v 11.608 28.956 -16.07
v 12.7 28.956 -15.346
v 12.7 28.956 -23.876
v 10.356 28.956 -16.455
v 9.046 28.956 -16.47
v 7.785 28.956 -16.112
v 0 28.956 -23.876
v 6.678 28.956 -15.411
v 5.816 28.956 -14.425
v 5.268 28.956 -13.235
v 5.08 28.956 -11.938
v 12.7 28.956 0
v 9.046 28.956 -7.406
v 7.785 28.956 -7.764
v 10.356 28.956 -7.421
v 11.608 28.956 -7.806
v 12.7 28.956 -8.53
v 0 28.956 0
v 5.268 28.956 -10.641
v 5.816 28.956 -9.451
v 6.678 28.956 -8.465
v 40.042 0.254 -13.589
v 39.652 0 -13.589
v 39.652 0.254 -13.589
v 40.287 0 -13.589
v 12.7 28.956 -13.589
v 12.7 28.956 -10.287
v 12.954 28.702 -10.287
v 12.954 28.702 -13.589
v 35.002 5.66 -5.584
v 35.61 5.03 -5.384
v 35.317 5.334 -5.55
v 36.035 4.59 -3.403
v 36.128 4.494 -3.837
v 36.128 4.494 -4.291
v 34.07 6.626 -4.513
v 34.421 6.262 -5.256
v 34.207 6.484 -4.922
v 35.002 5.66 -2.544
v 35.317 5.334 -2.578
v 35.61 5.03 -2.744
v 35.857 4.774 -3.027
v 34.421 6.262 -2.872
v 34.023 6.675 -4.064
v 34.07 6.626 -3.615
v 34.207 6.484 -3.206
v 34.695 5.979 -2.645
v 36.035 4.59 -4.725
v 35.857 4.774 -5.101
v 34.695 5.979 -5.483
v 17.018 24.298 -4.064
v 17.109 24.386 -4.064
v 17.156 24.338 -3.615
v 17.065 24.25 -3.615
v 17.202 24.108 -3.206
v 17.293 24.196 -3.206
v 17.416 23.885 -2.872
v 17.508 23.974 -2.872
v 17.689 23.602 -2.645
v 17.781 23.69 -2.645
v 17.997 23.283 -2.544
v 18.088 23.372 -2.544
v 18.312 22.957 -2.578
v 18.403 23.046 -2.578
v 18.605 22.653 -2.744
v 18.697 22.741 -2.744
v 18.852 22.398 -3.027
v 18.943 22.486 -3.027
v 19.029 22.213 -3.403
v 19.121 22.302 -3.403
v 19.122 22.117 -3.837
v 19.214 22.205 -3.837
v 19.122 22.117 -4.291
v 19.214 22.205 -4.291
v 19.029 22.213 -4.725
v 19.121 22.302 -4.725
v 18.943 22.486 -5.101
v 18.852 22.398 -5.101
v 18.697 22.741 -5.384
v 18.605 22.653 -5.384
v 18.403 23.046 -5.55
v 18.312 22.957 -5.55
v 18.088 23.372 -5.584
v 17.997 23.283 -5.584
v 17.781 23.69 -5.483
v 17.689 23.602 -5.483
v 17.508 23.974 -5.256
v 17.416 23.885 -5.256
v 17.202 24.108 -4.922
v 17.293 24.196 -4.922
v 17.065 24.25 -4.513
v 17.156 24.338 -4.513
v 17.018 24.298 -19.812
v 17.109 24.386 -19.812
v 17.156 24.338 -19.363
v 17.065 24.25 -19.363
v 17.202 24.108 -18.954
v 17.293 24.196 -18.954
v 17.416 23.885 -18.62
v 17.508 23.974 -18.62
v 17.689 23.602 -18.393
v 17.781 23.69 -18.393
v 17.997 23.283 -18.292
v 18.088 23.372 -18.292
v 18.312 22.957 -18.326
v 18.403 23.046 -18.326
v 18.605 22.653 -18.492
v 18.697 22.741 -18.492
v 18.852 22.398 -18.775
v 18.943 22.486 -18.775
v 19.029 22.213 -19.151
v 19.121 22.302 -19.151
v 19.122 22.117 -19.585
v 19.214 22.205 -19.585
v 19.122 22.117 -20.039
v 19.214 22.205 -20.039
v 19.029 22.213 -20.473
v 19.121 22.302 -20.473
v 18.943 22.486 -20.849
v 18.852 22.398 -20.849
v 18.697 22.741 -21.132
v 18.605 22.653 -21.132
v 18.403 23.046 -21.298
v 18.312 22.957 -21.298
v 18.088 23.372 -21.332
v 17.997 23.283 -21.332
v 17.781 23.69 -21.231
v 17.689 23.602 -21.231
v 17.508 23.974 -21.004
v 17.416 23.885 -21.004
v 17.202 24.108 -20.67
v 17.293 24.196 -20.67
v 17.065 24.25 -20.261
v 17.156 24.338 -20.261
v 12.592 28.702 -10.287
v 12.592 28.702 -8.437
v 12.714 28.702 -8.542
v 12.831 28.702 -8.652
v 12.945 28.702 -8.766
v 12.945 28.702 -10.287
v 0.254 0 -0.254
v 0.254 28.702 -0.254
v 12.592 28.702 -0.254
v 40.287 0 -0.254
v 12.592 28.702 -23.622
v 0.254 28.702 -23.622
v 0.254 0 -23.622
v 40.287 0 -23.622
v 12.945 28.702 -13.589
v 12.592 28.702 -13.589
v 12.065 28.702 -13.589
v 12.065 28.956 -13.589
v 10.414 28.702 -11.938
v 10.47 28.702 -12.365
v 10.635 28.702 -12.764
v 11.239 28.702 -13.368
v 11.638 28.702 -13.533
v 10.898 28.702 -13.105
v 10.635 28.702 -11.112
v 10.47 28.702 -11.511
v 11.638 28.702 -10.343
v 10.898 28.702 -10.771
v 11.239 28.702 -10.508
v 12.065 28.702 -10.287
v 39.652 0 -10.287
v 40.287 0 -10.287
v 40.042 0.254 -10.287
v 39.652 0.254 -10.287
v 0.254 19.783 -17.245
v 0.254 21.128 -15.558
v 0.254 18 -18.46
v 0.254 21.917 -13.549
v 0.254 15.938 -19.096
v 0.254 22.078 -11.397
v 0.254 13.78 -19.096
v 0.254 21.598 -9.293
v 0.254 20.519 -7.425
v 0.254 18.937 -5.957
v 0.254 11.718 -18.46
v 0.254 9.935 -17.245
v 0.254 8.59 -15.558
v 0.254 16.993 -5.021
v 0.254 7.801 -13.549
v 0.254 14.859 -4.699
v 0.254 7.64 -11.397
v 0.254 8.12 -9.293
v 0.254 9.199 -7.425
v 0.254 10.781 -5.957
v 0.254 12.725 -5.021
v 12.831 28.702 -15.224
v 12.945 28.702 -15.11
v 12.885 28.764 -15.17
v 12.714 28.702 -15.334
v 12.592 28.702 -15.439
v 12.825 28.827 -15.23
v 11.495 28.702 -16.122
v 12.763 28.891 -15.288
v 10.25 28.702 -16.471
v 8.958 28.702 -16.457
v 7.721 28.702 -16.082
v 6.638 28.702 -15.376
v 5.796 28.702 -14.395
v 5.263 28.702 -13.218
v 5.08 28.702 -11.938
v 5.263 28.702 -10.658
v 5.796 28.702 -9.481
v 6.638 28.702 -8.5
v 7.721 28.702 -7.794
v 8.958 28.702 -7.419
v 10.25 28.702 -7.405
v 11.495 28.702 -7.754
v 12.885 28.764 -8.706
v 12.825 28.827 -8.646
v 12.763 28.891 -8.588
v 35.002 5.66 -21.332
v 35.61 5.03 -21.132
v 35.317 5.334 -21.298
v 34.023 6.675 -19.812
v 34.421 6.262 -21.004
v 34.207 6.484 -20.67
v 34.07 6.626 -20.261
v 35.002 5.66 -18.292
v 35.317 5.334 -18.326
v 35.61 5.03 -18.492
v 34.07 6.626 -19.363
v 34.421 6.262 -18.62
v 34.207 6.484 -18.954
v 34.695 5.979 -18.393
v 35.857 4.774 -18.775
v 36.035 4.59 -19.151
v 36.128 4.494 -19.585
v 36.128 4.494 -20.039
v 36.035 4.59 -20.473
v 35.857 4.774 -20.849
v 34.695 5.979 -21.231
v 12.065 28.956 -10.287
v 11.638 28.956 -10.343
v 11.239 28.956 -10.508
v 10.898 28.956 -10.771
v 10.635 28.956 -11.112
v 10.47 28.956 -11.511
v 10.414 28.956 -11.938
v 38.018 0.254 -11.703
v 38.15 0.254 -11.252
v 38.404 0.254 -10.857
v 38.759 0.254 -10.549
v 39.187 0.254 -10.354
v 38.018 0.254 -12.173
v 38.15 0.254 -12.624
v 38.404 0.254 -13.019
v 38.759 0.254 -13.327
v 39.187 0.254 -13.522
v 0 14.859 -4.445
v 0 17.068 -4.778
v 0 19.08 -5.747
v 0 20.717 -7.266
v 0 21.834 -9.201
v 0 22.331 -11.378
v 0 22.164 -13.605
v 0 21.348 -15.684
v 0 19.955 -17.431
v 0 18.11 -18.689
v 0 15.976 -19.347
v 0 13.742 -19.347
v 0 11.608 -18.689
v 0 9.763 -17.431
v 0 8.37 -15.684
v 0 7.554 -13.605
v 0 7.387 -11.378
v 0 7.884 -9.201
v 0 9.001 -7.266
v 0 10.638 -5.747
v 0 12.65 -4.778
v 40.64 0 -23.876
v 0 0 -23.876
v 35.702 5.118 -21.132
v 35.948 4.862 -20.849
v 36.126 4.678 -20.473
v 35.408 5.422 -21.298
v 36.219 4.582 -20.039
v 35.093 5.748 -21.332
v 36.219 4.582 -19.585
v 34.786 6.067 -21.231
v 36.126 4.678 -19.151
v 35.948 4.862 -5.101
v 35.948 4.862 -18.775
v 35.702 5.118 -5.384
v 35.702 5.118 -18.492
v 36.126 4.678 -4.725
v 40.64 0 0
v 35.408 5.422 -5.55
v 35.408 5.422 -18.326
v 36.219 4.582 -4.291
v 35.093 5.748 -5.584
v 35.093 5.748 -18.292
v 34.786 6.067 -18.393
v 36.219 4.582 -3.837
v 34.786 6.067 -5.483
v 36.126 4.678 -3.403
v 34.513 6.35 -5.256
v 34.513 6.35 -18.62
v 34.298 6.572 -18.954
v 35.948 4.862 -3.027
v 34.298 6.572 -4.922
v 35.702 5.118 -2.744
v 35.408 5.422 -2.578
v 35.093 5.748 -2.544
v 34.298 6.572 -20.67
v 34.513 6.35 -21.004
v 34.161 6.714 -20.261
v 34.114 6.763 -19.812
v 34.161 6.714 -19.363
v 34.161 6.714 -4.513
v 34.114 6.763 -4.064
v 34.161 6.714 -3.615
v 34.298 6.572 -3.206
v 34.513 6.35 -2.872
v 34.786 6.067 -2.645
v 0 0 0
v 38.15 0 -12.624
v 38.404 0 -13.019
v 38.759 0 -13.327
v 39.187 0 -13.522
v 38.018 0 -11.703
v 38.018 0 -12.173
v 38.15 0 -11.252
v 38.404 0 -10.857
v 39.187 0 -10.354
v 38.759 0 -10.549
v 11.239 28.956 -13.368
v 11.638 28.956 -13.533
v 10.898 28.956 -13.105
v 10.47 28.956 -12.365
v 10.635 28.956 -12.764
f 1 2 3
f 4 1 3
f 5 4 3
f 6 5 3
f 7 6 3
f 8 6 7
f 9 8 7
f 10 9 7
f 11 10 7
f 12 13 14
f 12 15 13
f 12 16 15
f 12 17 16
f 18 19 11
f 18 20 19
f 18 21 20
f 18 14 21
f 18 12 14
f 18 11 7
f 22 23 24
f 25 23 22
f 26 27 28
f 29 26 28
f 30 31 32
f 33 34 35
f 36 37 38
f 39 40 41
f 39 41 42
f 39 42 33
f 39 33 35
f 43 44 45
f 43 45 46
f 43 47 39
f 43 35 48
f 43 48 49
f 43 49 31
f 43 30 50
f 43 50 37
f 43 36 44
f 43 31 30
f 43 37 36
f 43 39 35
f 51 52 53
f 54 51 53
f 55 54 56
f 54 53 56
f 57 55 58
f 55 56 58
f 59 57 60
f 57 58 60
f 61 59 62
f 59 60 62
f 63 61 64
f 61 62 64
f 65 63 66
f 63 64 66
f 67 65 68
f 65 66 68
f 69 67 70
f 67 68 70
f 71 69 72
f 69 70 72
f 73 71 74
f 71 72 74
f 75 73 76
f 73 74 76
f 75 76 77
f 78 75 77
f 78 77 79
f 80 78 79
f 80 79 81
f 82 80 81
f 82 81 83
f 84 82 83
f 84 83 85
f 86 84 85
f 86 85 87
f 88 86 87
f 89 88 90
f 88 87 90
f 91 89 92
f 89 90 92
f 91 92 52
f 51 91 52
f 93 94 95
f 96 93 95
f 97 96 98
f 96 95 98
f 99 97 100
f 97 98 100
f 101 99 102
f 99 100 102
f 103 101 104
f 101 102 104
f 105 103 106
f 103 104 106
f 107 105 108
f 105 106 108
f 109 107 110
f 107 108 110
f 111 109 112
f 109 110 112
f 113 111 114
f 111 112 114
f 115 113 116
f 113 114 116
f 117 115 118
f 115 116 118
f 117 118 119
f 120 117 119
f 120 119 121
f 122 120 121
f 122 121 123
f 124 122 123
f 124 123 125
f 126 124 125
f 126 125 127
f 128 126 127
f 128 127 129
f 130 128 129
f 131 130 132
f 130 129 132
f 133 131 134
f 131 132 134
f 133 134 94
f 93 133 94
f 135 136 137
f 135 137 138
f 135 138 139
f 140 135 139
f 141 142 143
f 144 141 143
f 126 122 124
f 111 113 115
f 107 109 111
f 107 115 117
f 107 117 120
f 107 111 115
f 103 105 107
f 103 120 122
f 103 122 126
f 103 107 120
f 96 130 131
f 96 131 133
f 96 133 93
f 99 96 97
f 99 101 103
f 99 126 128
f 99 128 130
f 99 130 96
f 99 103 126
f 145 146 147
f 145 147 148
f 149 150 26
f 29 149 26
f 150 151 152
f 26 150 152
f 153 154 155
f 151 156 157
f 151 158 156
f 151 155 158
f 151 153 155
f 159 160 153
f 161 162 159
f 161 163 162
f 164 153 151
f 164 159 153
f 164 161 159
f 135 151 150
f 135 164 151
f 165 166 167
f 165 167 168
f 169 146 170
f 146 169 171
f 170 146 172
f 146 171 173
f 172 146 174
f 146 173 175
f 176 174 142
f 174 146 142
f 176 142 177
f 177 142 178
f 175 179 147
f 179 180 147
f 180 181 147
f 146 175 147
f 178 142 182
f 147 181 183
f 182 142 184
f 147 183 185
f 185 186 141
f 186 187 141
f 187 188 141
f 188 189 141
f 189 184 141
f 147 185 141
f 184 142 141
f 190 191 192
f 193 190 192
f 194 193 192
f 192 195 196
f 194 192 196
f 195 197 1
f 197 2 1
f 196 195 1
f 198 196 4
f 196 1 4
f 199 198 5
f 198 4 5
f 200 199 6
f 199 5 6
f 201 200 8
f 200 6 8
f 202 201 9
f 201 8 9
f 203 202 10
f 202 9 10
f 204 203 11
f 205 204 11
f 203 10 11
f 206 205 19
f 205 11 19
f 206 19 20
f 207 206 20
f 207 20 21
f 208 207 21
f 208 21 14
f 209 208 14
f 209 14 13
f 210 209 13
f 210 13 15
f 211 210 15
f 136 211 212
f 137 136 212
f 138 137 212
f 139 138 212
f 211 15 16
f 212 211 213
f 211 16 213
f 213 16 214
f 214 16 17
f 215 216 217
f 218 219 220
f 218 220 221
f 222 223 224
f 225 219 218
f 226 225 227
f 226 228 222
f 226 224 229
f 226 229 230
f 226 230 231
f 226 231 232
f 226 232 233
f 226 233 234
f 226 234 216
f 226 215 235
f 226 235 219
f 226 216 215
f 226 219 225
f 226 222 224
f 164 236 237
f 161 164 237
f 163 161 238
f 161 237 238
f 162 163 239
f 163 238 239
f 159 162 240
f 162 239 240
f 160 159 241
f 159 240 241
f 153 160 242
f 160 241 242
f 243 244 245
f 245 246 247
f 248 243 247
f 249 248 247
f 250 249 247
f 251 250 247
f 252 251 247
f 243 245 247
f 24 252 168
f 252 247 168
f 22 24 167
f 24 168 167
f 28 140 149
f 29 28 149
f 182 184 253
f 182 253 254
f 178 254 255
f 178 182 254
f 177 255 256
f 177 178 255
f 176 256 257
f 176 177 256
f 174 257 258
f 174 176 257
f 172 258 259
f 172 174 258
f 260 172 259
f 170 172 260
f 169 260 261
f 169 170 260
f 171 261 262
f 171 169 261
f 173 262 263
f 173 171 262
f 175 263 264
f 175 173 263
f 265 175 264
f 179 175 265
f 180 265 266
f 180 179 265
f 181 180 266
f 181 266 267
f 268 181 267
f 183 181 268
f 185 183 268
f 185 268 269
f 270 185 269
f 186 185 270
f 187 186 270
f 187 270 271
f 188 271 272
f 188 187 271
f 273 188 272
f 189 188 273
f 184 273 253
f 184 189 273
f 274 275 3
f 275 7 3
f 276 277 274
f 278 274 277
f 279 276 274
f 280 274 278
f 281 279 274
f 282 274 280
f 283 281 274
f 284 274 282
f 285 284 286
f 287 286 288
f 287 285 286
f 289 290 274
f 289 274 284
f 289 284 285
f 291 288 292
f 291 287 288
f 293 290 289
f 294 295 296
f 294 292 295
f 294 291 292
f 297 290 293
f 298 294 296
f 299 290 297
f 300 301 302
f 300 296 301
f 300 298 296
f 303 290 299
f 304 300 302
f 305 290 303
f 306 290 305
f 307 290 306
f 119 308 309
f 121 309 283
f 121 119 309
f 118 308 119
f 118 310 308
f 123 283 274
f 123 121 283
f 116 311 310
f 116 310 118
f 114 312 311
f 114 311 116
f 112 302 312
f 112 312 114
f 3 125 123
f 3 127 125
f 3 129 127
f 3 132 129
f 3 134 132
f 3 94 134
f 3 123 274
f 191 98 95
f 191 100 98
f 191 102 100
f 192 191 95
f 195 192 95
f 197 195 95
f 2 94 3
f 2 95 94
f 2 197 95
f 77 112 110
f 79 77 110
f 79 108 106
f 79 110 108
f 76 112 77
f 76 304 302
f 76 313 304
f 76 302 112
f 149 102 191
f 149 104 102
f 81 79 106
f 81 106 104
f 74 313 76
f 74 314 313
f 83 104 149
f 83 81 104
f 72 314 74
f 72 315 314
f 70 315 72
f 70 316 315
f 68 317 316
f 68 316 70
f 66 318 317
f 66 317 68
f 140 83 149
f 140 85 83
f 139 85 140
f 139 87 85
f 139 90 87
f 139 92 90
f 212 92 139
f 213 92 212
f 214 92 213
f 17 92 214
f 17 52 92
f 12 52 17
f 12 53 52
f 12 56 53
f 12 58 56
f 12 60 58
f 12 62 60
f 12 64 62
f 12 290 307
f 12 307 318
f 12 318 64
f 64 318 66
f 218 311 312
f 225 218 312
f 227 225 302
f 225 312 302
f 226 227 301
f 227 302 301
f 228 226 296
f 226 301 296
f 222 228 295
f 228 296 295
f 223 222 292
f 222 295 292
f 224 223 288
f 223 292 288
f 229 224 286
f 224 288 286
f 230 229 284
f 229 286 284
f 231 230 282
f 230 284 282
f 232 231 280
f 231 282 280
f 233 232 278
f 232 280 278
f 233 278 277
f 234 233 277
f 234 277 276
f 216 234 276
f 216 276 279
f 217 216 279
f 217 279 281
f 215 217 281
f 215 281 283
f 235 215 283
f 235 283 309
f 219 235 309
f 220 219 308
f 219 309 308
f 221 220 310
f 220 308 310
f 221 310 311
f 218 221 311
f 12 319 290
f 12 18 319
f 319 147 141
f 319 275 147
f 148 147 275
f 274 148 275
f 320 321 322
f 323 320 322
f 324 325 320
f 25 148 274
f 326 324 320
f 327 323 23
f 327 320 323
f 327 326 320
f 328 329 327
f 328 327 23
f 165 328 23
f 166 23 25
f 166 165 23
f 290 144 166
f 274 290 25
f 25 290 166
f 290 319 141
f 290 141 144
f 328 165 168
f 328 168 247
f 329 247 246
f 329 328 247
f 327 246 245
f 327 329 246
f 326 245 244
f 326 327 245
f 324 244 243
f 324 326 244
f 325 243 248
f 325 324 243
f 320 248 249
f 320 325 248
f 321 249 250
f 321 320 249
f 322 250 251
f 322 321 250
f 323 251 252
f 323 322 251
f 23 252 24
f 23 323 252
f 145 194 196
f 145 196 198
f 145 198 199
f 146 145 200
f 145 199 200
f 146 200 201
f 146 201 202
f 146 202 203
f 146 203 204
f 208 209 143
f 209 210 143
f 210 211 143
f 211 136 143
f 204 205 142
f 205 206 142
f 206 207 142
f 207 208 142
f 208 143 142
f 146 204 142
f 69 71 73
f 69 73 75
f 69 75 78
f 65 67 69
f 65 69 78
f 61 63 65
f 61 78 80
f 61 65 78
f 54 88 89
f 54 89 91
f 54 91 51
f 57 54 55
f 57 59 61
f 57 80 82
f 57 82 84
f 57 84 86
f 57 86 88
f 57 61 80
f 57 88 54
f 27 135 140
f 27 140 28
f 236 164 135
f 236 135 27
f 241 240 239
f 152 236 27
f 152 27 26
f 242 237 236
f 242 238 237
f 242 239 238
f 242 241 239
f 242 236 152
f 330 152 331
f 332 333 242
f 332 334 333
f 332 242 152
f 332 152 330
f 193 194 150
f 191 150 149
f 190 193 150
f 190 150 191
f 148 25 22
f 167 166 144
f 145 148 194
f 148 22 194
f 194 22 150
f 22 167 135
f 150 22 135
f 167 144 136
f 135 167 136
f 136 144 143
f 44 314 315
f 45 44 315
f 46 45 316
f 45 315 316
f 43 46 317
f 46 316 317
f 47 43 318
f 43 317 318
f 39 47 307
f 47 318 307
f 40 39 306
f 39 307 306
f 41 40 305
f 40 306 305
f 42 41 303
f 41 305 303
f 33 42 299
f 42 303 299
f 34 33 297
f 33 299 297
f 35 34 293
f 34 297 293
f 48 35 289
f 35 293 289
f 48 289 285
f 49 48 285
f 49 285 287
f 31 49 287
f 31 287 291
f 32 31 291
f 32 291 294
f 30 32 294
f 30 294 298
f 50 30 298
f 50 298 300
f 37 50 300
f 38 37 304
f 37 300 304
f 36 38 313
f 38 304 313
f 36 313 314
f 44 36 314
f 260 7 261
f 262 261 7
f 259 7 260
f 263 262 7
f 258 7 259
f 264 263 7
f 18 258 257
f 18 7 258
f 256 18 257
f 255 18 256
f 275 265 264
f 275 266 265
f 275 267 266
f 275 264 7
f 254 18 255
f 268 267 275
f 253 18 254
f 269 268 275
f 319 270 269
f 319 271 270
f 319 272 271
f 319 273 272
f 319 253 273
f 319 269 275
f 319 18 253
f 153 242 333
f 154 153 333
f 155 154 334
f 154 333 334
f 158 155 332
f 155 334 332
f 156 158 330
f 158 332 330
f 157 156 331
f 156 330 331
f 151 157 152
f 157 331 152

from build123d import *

# Parameters (mm, degrees)
BOSS_EXTRUDE1_DEPTH = 23.876
SHELL1_T            = -0.254
SKETCH2_R           = 7.239
CUT_EXTRUDE1_DEPTH  = 0.254
CHAMFER1_SIZE       = 0.254
SKETCH3_R           = 1.524
CUT_EXTRUDE2_DEPTH  = 0.127
SKETCH9_R           = 4.572
CUT_EXTRUDE3_DEPTH  = 0.254
SKETCH18_W          = 2.286
SKETCH18_H          = 0.254
BOSS_EXTRUDE5_DEPTH = 1.651
CUT_EXTRUDE4_DEPTH  = 3.302
SKETCH20_W          = 3.302
SKETCH20_H          = 0.254
BOSS_EXTRUDE6_DEPTH = 0.254
CUT_EXTRUDE5_DEPTH  = 2.667
BOSS_EXTRUDE7_DEPTH = 0.254


with BuildPart() as part:
    # Sketch1 → Boss-Extrude1 (new body)
    with BuildSketch(Plane.XY):
        Polygon((0, 0), (40.64, 0), (12.7, 28.956), (0, 28.956), align=None)
    extrude(amount=-BOSS_EXTRUDE1_DEPTH)

    # Shell1
    shell1_openings = [part.faces().sort_by_distance(p)[0] for p in [
        (20.32, 0, -11.938),
    ]]
    offset(amount=SHELL1_T, openings=shell1_openings, kind=Kind.INTERSECTION)

    # Sketch2 → Cut-Extrude1 (cut)
    with BuildSketch(Plane.ZY):
        with Locations((-11.938, 14.859)):
            Circle(SKETCH2_R)
    extrude(amount=-CUT_EXTRUDE1_DEPTH, mode=Mode.SUBTRACT)

    # Chamfer1
    chamfer1_edges = [part.edges().sort_by_distance(p)[0] for p in [
        (0, 14.859, -19.177),
    ]]
    chamfer(chamfer1_edges, length=CHAMFER1_SIZE - 0.0001)  # a hair under: the kernel refuses the full size

    # Sketch3 → Cut-Extrude2 (cut)
    with BuildSketch(Plane(origin=(21.045482945, 20.307044947, 0), x_dir=(0, 0, -1), z_dir=(0.7196189619724784, 0.6943691738330935, 0))):
        with Locations(Location((19.812, 4.144798155, 0), (0, 0, 90))):
            Circle(SKETCH3_R)
        with Locations(Location((19.812, -20.345163225, 0), (0, 0, 90))):
            Circle(SKETCH3_R)
        with Locations(Location((4.064, 4.144798155, 0), (0, 0, 90))):
            Circle(SKETCH3_R)
        with Locations(Location((4.064, -20.345163225, 0), (0, 0, 90))):
            Circle(SKETCH3_R)
    extrude(amount=-CUT_EXTRUDE2_DEPTH, mode=Mode.SUBTRACT)

    # Sketch9 → Cut-Extrude3 (cut)
    with BuildSketch(Plane(origin=(0, 28.956, 0), x_dir=(1, 0, 0), z_dir=(0, 1, 0))):
        with Locations((9.652, 11.938)):
            Circle(SKETCH9_R)
    extrude(amount=-CUT_EXTRUDE3_DEPTH, mode=Mode.SUBTRACT)

    # Sketch18 → Boss-Extrude5 (add, symmetric)
    with BuildSketch(Plane.XY.offset(-11.938)):
        with Locations((11.557, 28.829)):
            Rectangle(SKETCH18_W, SKETCH18_H)
    extrude(amount=BOSS_EXTRUDE5_DEPTH, both=True)

    # Sketch19 → Cut-Extrude4 (cut)
    with BuildSketch(Plane(origin=(0, 28.956, 0), x_dir=(1, 0, 0), z_dir=(0, 1, 0))):
        with BuildLine():
            Line((10.414, 10.287), (12.065, 10.287))
            ThreePointArc((12.065, 10.287), (10.897566704, 10.770566704), (10.414, 11.938))
            Line((10.414, 11.938), (10.414, 10.287))
        make_face()
        with BuildLine():
            Line((10.414, 13.589), (10.414, 11.938))
            ThreePointArc((10.414, 11.938), (10.897566704, 13.105433296), (12.065, 13.589))
            Line((12.065, 13.589), (10.414, 13.589))
        make_face()
    extrude(amount=-CUT_EXTRUDE4_DEPTH, mode=Mode.SUBTRACT)

    # Sketch20 → Boss-Extrude6 (add)
    with BuildSketch(Plane(origin=(12.7, 0, 0), x_dir=(0, 0, -1), z_dir=(1, 0, 0))):
        with Locations((11.938, 28.829)):
            Rectangle(SKETCH20_W, SKETCH20_H)
    extrude(amount=BOSS_EXTRUDE6_DEPTH)

    # Sketch22 → Cut-Extrude5 (cut, symmetric)
    with BuildSketch(Plane.XY.offset(-11.938)):
        Polygon((12.7, 28.956), (12.954, 28.702), (12.954, 28.956), align=None)
    extrude(amount=CUT_EXTRUDE5_DEPTH, both=True, mode=Mode.SUBTRACT)

    # Sketch23 → Boss-Extrude7 (add)
    with BuildSketch(Plane.XZ):
        with BuildLine():
            Line((39.652035426, -13.589), (40.287035426, -13.589))
            Line((40.287035426, -13.589), (40.287035426, -10.287))
            Line((40.287035426, -10.287), (39.652035426, -10.287))
            ThreePointArc((39.652035426, -10.287), (38.001035426, -11.938), (39.652035426, -13.589))
        make_face()
    extrude(amount=-BOSS_EXTRUDE7_DEPTH)


solid = part.part
